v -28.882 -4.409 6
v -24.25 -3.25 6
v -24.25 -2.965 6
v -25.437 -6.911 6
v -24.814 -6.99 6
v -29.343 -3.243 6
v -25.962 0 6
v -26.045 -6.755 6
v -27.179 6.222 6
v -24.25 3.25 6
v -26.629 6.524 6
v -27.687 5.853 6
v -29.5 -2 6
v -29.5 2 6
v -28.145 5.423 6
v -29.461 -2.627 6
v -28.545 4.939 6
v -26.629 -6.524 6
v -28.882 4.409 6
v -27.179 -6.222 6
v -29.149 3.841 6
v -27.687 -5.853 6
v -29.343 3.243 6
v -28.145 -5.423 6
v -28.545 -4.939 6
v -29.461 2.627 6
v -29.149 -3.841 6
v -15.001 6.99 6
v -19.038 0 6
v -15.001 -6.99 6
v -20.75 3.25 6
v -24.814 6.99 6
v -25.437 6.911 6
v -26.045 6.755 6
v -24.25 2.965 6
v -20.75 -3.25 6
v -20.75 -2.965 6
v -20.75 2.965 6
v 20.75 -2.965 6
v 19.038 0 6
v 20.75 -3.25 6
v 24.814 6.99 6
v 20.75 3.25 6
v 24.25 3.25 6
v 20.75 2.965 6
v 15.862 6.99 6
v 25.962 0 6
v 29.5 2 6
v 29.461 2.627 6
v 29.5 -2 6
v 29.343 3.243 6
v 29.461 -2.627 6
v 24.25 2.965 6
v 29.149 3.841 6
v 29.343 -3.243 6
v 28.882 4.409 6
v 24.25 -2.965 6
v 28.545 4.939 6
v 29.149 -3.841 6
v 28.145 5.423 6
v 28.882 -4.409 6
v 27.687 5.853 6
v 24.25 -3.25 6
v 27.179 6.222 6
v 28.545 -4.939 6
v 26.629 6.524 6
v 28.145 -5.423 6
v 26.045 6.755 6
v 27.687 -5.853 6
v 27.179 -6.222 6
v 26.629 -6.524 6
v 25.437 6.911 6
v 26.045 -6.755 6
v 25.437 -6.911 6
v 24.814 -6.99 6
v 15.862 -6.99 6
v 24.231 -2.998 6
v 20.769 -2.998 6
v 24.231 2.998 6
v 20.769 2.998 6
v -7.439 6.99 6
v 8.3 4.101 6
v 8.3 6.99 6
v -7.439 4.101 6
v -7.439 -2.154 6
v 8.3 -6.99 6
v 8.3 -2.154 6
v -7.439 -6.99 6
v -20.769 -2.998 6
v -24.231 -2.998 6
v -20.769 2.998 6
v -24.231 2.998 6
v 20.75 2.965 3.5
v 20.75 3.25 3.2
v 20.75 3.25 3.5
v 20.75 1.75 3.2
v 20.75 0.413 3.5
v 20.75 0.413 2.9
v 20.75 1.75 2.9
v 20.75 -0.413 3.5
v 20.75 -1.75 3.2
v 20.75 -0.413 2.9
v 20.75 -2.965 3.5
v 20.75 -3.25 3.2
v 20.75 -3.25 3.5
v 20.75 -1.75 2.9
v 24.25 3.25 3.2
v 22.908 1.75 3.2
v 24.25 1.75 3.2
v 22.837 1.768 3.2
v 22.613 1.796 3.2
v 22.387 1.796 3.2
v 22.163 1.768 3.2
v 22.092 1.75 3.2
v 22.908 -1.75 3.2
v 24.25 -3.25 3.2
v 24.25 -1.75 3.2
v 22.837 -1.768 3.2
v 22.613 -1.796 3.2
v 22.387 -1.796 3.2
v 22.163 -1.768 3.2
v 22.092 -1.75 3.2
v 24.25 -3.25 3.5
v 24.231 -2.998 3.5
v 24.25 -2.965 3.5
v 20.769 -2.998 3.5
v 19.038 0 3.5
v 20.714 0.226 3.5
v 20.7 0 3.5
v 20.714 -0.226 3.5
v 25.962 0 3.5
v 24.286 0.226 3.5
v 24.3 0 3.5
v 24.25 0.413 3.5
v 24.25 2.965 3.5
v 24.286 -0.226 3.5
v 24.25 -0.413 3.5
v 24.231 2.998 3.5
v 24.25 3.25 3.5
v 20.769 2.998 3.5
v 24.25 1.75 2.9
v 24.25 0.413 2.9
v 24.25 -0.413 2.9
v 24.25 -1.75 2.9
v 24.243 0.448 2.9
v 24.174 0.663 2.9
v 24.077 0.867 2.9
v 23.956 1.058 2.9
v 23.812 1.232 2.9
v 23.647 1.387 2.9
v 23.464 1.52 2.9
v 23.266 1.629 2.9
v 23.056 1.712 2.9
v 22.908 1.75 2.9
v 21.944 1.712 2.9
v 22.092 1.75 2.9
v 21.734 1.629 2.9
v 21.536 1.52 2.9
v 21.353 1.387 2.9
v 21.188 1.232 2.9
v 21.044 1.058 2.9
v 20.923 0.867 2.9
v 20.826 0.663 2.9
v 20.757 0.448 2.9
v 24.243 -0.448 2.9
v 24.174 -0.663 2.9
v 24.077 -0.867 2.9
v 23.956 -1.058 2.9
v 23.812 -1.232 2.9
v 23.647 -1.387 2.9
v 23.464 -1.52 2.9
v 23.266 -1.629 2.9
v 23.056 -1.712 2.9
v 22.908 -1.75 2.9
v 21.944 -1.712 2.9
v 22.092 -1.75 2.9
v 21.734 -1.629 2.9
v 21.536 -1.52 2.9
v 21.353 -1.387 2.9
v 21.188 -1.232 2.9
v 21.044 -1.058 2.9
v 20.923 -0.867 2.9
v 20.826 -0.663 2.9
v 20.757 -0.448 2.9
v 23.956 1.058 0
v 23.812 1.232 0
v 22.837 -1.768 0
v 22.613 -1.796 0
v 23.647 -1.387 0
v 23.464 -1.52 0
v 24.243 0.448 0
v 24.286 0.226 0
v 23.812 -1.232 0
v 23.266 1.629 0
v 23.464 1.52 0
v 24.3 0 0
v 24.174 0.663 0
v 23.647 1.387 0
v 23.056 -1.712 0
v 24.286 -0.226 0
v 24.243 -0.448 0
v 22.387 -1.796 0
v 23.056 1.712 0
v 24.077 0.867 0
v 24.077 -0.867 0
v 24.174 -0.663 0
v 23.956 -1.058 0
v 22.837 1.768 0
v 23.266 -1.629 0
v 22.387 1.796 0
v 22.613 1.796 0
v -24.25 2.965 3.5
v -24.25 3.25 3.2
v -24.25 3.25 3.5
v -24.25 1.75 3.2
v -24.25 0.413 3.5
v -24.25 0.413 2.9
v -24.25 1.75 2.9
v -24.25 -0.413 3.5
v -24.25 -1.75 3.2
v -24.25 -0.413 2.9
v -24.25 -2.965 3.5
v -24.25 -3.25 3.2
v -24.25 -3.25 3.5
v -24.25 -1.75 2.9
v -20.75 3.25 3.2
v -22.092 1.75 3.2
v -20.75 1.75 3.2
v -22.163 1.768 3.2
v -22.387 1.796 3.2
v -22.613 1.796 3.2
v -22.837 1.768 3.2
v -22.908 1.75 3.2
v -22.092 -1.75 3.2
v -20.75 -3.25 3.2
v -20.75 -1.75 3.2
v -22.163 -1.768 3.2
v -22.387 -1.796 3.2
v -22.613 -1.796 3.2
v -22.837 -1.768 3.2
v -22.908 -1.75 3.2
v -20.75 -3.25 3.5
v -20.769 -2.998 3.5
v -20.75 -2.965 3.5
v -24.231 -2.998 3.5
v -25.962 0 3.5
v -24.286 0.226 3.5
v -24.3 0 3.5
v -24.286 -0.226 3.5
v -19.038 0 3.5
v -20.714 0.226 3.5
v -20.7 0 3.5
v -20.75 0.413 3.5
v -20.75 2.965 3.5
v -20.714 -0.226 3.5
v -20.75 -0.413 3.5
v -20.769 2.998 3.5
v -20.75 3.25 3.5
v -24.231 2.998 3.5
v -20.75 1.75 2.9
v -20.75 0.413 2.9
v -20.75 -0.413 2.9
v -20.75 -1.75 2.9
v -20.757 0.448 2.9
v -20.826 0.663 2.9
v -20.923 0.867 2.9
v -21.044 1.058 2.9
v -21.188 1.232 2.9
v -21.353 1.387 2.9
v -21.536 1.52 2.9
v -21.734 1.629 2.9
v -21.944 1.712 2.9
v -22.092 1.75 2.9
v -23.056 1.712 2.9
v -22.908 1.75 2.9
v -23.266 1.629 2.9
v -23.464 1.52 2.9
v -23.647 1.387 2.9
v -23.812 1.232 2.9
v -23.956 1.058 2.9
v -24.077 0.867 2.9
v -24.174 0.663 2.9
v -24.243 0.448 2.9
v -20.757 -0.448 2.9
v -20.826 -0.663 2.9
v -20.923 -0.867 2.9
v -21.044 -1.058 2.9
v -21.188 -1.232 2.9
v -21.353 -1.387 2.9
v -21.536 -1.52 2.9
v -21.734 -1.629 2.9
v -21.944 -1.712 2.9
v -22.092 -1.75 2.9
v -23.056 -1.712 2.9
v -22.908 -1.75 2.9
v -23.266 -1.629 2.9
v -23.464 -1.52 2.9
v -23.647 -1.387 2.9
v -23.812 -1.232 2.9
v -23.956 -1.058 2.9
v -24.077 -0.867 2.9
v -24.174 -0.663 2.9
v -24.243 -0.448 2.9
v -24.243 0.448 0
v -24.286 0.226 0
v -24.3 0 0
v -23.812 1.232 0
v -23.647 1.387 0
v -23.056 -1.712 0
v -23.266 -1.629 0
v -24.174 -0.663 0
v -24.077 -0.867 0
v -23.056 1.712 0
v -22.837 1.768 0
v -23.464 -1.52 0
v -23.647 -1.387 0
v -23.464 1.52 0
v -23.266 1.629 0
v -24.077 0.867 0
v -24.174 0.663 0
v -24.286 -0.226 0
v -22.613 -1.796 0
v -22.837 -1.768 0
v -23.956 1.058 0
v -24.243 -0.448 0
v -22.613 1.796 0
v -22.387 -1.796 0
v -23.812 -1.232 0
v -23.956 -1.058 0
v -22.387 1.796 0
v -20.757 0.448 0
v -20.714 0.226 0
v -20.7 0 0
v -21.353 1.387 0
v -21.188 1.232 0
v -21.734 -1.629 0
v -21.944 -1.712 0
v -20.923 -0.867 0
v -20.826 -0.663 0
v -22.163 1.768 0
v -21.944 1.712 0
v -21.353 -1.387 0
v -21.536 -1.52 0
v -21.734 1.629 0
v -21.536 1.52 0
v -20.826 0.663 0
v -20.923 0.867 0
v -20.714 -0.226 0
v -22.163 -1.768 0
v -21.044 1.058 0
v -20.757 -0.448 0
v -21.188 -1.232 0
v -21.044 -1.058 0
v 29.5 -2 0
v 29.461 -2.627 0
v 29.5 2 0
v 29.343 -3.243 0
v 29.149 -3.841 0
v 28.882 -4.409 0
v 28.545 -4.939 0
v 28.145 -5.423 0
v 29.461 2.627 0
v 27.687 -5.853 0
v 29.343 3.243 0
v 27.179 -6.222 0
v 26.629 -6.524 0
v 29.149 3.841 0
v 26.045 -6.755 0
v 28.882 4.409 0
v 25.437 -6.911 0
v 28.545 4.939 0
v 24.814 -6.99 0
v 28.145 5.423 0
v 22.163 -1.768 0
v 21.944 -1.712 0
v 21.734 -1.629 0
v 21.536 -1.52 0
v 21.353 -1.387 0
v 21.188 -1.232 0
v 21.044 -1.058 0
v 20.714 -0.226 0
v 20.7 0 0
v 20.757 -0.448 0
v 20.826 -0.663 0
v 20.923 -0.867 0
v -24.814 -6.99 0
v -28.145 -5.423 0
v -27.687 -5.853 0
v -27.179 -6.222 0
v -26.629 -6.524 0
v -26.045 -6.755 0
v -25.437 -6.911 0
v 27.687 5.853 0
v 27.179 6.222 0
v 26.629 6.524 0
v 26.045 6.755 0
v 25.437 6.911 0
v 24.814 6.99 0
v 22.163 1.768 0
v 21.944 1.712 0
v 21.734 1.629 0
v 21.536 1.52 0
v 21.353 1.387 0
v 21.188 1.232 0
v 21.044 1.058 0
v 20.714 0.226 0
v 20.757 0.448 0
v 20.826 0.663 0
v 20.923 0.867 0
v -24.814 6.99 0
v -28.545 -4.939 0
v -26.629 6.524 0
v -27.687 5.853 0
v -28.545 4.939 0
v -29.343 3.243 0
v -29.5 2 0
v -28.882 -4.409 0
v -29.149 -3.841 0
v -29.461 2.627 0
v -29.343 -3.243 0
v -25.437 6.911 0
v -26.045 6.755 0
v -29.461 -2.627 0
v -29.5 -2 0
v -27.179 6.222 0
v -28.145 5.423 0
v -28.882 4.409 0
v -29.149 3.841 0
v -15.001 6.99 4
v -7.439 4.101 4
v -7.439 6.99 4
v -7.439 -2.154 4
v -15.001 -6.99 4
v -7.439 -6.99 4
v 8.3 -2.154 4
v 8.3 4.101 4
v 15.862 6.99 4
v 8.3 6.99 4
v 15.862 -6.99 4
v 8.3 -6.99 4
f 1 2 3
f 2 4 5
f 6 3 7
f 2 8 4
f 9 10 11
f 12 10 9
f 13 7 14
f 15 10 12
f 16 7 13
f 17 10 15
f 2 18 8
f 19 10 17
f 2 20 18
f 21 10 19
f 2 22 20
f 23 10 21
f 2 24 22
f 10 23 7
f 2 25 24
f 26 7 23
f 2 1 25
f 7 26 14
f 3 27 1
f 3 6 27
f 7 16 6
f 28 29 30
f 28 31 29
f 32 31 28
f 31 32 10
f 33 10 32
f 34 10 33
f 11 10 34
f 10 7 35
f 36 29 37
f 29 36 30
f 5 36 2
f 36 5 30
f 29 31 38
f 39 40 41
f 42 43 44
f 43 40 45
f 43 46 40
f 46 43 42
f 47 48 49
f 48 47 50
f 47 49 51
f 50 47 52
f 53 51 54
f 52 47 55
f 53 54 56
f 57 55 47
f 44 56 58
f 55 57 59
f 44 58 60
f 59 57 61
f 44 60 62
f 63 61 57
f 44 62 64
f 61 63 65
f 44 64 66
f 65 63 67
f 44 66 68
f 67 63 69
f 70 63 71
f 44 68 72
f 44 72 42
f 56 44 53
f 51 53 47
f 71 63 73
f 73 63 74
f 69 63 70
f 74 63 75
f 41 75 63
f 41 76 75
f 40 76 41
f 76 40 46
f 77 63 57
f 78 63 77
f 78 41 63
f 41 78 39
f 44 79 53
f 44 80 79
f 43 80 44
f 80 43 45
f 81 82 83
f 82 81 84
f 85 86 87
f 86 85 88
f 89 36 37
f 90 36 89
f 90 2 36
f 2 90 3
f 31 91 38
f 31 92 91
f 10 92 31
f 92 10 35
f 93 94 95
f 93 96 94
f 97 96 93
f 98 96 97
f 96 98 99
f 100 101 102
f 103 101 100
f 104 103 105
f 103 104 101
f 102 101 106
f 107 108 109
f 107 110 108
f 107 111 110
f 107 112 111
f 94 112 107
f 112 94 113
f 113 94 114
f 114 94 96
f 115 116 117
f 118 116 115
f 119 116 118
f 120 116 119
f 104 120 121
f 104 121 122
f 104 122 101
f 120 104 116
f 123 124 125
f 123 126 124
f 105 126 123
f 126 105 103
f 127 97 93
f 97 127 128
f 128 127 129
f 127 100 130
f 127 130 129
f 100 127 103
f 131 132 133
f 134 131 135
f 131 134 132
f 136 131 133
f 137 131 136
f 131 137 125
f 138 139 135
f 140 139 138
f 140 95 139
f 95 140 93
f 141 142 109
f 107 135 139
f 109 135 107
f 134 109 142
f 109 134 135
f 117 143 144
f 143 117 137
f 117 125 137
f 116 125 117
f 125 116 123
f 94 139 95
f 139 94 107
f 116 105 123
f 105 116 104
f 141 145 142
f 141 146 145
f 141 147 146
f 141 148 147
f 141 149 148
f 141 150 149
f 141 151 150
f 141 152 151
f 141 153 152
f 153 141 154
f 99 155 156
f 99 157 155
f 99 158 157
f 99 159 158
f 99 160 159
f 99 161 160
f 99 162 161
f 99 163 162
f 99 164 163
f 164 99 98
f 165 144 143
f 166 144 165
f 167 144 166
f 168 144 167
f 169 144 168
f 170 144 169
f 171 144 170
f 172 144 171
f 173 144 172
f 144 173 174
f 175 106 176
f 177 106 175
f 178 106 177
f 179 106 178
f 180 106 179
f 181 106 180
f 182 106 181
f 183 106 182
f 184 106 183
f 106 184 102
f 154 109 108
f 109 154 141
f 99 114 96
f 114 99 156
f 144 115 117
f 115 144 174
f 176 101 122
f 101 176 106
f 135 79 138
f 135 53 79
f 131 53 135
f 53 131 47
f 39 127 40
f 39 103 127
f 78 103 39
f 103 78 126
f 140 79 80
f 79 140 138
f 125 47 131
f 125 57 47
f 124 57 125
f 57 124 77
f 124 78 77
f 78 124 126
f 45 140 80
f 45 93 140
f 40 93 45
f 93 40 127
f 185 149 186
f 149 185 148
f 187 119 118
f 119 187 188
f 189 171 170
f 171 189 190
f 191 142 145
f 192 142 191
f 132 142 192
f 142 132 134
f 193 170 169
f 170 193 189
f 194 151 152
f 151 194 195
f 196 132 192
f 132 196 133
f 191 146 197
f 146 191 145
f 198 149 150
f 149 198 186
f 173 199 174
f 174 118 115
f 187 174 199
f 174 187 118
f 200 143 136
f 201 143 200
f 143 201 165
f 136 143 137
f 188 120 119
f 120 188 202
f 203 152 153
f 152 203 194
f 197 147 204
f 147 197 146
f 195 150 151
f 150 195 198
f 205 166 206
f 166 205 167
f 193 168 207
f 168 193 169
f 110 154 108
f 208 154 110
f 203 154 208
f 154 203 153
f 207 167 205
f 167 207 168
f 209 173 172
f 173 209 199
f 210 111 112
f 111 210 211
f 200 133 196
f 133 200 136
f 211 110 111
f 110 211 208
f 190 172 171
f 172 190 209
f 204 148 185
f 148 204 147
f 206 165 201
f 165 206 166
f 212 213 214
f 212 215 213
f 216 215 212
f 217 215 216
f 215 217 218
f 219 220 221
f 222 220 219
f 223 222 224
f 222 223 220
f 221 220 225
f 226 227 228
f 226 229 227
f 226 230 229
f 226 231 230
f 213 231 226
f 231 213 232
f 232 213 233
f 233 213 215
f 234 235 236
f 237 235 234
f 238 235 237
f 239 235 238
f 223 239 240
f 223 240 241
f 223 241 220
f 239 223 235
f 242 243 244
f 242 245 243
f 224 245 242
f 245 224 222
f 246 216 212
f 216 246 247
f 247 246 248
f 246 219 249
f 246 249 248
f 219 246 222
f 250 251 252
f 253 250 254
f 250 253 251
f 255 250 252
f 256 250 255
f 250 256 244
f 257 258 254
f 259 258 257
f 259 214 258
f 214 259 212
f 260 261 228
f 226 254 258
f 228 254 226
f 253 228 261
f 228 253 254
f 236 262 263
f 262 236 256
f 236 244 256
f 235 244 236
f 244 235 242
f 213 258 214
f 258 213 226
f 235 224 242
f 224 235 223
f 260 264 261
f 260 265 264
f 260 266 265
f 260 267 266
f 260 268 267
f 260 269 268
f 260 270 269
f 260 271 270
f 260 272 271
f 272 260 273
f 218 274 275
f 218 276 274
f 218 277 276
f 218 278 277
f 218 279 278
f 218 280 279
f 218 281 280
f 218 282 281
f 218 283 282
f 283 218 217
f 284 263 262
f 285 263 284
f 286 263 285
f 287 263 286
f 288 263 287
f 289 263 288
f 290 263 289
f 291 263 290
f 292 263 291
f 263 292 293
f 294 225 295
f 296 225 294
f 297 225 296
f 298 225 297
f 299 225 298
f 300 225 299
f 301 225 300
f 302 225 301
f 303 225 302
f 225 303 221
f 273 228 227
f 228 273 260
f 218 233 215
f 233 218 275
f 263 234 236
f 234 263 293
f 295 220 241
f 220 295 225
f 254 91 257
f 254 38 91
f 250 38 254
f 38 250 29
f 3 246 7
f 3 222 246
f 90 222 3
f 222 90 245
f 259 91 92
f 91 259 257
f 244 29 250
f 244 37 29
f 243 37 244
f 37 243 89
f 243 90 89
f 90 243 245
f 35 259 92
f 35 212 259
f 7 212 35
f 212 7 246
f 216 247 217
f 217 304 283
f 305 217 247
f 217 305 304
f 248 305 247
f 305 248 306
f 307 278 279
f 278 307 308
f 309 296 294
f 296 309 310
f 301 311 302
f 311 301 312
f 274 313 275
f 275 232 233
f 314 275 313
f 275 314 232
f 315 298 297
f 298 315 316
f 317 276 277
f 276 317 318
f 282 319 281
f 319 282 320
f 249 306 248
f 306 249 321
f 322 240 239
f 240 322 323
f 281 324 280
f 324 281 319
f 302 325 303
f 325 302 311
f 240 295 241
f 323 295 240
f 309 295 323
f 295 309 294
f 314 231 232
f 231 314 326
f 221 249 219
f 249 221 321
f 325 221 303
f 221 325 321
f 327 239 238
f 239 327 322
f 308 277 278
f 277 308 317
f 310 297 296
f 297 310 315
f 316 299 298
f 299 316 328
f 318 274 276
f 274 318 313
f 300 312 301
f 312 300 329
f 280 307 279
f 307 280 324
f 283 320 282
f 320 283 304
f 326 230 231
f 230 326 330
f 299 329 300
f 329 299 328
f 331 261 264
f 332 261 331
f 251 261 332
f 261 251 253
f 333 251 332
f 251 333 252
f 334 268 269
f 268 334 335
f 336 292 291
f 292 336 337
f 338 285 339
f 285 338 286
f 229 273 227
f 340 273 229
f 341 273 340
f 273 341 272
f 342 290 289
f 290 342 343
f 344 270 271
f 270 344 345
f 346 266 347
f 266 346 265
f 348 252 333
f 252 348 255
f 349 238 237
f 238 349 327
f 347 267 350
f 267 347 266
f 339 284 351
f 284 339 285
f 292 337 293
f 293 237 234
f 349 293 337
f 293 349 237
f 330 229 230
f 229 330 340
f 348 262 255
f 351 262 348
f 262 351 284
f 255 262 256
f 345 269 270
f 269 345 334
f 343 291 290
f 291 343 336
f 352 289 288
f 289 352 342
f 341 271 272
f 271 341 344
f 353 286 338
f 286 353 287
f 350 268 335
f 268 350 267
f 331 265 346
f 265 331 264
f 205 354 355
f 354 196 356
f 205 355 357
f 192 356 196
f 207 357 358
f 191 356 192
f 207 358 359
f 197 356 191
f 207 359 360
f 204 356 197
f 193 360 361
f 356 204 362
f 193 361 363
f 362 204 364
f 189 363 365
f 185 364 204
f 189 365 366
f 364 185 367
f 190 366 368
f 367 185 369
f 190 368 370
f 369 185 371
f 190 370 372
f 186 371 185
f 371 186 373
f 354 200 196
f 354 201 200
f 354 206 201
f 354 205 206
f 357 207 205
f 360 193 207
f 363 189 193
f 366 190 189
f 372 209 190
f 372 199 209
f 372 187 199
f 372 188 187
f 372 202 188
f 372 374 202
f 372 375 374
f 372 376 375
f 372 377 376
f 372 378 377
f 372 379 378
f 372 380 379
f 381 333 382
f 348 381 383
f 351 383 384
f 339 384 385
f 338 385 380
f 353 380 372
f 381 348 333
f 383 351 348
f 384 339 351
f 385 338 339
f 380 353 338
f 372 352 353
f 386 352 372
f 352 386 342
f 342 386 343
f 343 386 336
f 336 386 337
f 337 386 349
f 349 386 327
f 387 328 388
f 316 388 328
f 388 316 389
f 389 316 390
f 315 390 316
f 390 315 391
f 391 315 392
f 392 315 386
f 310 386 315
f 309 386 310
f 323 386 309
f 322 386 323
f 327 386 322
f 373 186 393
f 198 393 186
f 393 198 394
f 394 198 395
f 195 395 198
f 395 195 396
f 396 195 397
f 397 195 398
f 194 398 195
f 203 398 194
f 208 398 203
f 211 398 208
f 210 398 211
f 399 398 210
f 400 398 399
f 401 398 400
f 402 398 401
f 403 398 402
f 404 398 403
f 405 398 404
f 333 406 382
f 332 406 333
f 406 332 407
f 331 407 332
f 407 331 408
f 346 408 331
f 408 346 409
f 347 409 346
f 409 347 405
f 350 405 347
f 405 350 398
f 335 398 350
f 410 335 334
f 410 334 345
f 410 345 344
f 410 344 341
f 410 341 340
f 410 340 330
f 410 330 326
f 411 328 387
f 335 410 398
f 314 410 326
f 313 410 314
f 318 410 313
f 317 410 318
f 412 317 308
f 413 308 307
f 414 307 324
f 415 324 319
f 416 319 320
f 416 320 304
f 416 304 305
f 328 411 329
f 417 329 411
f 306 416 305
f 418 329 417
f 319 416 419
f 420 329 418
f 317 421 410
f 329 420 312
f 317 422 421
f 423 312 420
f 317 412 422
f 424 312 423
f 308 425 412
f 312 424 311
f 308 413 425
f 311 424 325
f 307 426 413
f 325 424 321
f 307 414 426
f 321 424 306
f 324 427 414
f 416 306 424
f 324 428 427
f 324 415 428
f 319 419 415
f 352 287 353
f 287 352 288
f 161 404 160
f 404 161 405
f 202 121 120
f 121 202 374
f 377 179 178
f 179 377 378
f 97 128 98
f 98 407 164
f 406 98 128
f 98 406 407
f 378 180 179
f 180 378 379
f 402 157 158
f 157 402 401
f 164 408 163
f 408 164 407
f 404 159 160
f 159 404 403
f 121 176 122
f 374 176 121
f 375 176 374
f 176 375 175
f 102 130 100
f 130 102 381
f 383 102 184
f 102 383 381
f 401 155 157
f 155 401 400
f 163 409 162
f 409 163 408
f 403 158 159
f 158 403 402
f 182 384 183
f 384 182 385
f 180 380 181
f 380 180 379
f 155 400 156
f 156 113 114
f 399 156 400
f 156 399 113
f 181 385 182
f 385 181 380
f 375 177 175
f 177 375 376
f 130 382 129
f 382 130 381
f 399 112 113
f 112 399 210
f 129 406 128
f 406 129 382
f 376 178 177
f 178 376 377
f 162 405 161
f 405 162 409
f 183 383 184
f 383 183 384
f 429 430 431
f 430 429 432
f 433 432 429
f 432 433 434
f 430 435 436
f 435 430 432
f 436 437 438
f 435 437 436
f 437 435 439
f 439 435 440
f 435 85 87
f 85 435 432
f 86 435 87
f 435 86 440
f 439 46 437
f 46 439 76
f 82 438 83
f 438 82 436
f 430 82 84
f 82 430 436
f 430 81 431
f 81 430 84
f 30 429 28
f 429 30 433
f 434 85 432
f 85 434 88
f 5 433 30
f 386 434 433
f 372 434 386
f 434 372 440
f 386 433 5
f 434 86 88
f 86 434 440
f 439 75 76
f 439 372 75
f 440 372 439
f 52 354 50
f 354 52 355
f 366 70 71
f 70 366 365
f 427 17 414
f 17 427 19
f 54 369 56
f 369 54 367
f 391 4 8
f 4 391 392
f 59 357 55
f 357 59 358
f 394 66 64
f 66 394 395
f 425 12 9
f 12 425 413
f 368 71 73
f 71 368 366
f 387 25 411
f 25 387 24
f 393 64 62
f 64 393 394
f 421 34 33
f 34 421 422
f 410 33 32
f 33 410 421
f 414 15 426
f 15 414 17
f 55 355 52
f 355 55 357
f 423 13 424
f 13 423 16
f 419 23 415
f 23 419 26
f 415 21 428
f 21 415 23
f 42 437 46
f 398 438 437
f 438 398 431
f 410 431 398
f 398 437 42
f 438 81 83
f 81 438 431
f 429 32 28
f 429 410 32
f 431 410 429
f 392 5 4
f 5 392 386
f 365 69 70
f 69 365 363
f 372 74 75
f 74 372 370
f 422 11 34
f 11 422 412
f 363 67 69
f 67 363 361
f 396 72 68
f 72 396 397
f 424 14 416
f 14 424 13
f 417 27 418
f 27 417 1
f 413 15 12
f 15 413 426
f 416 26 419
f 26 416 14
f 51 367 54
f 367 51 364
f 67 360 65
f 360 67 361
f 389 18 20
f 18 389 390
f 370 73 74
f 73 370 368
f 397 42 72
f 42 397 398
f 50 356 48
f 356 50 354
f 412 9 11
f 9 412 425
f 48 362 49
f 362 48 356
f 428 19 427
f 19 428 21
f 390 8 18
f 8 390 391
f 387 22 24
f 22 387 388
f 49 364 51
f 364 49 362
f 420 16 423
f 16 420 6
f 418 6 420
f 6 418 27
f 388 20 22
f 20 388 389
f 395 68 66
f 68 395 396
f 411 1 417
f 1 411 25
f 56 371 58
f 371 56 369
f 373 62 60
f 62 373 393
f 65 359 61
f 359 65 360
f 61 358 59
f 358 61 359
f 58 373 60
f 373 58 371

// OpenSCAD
$fn = 50;


difference() {
	union() {
		hull() {
			translate(v = [-24.5000000000, 2.0000000000, 0]) {
				cylinder(h = 6, r = 5);
			}
			translate(v = [24.5000000000, 2.0000000000, 0]) {
				cylinder(h = 6, r = 5);
			}
			translate(v = [-24.5000000000, -2.0000000000, 0]) {
				cylinder(h = 6, r = 5);
			}
			translate(v = [24.5000000000, -2.0000000000, 0]) {
				cylinder(h = 6, r = 5);
			}
		}
	}
	union() {
		translate(v = [22.5000000000, 0, -20]) {
			rotate(a = [0, 180, 0]) {
				difference() {
					union() {
						translate(v = [0, 0, -26.0000000000]) {
							rotate(a = [0, 0, 0]) {
								difference() {
									union() {
										#translate(v = [-1.7500000000, -3.2500000000, -0.3000000000]) {
											cube(size = [3.5000000000, 6.5000000000, 0.3000000000]);
										}
										#translate(v = [-1.7500000000, -1.7500000000, -0.6000000000]) {
											cube(size = [3.5000000000, 3.5000000000, 0.3000000000]);
										}
										#translate(v = [-1.7500000000, -3.2500000000, 2.5000000000]) {
											cube(size = [3.5000000000, 6.5000000000, 0.3000000000]);
										}
										#translate(v = [-1.7500000000, -1.7500000000, 2.8000000000]) {
											cube(size = [3.5000000000, 3.5000000000, 0.3000000000]);
										}
										#linear_extrude(height = 2.5000000000) {
											polygon(points = [[3.4620000000, 0.0000000000], [1.7310000000, 2.9981799479], [-1.7310000000, 2.9981799479], [-3.4620000000, 0.0000000000], [-1.7310000000, -2.9981799479], [1.7310000000, -2.9981799479]]);
										}
										#translate(v = [-1.7500000000, -3.2500000000, -0.3000000000]) {
											cube(size = [3.5000000000, 6.5000000000, 0.3000000000]);
										}
										#translate(v = [-1.7500000000, -1.7500000000, -0.6000000000]) {
											cube(size = [3.5000000000, 3.5000000000, 0.3000000000]);
										}
										#translate(v = [-1.7500000000, -3.2500000000, 2.5000000000]) {
											cube(size = [3.5000000000, 6.5000000000, 0.3000000000]);
										}
										#translate(v = [-1.7500000000, -1.7500000000, 2.8000000000]) {
											cube(size = [3.5000000000, 3.5000000000, 0.3000000000]);
										}
										#translate(v = [-1.7500000000, -3.2500000000, -0.3000000000]) {
											cube(size = [3.5000000000, 6.5000000000, 0.3000000000]);
										}
										#translate(v = [-1.7500000000, -1.7500000000, -0.6000000000]) {
											cube(size = [3.5000000000, 3.5000000000, 0.3000000000]);
										}
										#translate(v = [-1.7500000000, -3.2500000000, 2.5000000000]) {
											cube(size = [3.5000000000, 6.5000000000, 0.3000000000]);
										}
										#translate(v = [-1.7500000000, -1.7500000000, 2.8000000000]) {
											cube(size = [3.5000000000, 3.5000000000, 0.3000000000]);
										}
									}
									union();
								}
							}
						}
						translate(v = [0, 0, -26.0000000000]) {
							rotate(a = [0, 0, 0]) {
								difference() {
									union() {
										#translate(v = [-1.7500000000, -3.2500000000, -0.3000000000]) {
											cube(size = [3.5000000000, 6.5000000000, 0.3000000000]);
										}
										#translate(v = [-1.7500000000, -1.7500000000, -0.6000000000]) {
											cube(size = [3.5000000000, 3.5000000000, 0.3000000000]);
										}
										#translate(v = [-1.7500000000, -3.2500000000, 2.5000000000]) {
											cube(size = [3.5000000000, 6.5000000000, 0.3000000000]);
										}
										#translate(v = [-1.7500000000, -1.7500000000, 2.8000000000]) {
											cube(size = [3.5000000000, 3.5000000000, 0.3000000000]);
										}
										#linear_extrude(height = 2.5000000000) {
											polygon(points = [[3.4620000000, 0.0000000000], [1.7310000000, 2.9981799479], [-1.7310000000, 2.9981799479], [-3.4620000000, 0.0000000000], [-1.7310000000, -2.9981799479], [1.7310000000, -2.9981799479]]);
										}
										#translate(v = [-1.7500000000, -3.2500000000, -0.3000000000]) {
											cube(size = [3.5000000000, 6.5000000000, 0.3000000000]);
										}
										#translate(v = [-1.7500000000, -1.7500000000, -0.6000000000]) {
											cube(size = [3.5000000000, 3.5000000000, 0.3000000000]);
										}
										#translate(v = [-1.7500000000, -3.2500000000, 2.5000000000]) {
											cube(size = [3.5000000000, 6.5000000000, 0.3000000000]);
										}
										#translate(v = [-1.7500000000, -1.7500000000, 2.8000000000]) {
											cube(size = [3.5000000000, 3.5000000000, 0.3000000000]);
										}
										#translate(v = [-1.7500000000, -3.2500000000, -0.3000000000]) {
											cube(size = [3.5000000000, 6.5000000000, 0.3000000000]);
										}
										#translate(v = [-1.7500000000, -1.7500000000, -0.6000000000]) {
											cube(size = [3.5000000000, 3.5000000000, 0.3000000000]);
										}
										#translate(v = [-1.7500000000, -3.2500000000, 2.5000000000]) {
											cube(size = [3.5000000000, 6.5000000000, 0.3000000000]);
										}
										#translate(v = [-1.7500000000, -1.7500000000, 2.8000000000]) {
											cube(size = [3.5000000000, 3.5000000000, 0.3000000000]);
										}
									}
									union();
								}
							}
						}
						translate(v = [0, 0, -26.0000000000]) {
							rotate(a = [0, 0, 0]) {
								difference() {
									union() {
										#translate(v = [-1.7500000000, -3.2500000000, -0.3000000000]) {
											cube(size = [3.5000000000, 6.5000000000, 0.3000000000]);
										}
										#translate(v = [-1.7500000000, -1.7500000000, -0.6000000000]) {
											cube(size = [3.5000000000, 3.5000000000, 0.3000000000]);
										}
										#translate(v = [-1.7500000000, -3.2500000000, 2.5000000000]) {
											cube(size = [3.5000000000, 6.5000000000, 0.3000000000]);
										}
										#translate(v = [-1.7500000000, -1.7500000000, 2.8000000000]) {
											cube(size = [3.5000000000, 3.5000000000, 0.3000000000]);
										}
										#linear_extrude(height = 2.5000000000) {
											polygon(points = [[3.4620000000, 0.0000000000], [1.7310000000, 2.9981799479], [-1.7310000000, 2.9981799479], [-3.4620000000, 0.0000000000], [-1.7310000000, -2.9981799479], [1.7310000000, -2.9981799479]]);
										}
										#translate(v = [-1.7500000000, -3.2500000000, -0.3000000000]) {
											cube(size = [3.5000000000, 6.5000000000, 0.3000000000]);
										}
										#translate(v = [-1.7500000000, -1.7500000000, -0.6000000000]) {
											cube(size = [3.5000000000, 3.5000000000, 0.3000000000]);
										}
										#translate(v = [-1.7500000000, -3.2500000000, 2.5000000000]) {
											cube(size = [3.5000000000, 6.5000000000, 0.3000000000]);
										}
										#translate(v = [-1.7500000000, -1.7500000000, 2.8000000000]) {
											cube(size = [3.5000000000, 3.5000000000, 0.3000000000]);
										}
										#translate(v = [-1.7500000000, -3.2500000000, -0.3000000000]) {
											cube(size = [3.5000000000, 6.5000000000, 0.3000000000]);
										}
										#translate(v = [-1.7500000000, -1.7500000000, -0.6000000000]) {
											cube(size = [3.5000000000, 3.5000000000, 0.3000000000]);
										}
										#translate(v = [-1.7500000000, -3.2500000000, 2.5000000000]) {
											cube(size = [3.5000000000, 6.5000000000, 0.3000000000]);
										}
										#translate(v = [-1.7500000000, -1.7500000000, 2.8000000000]) {
											cube(size = [3.5000000000, 3.5000000000, 0.3000000000]);
										}
									}
									union();
								}
							}
						}
						#translate(v = [0, 0, -26.0000000000]) {
							cylinder(h = 26, r = 1.5000000000);
						}
						#translate(v = [0, 0, -1.9000000000]) {
							cylinder(h = 1.9000000000, r1 = 1.8000000000, r2 = 3.6000000000);
						}
						#translate(v = [0, 0, -26.0000000000]) {
							cylinder(h = 26, r = 1.8000000000);
						}
						#translate(v = [0, 0, -26.0000000000]) {
							cylinder(h = 26, r = 1.5000000000);
						}
					}
					union();
				}
			}
		}
		translate(v = [-22.5000000000, 0, -20]) {
			rotate(a = [0, 180, 0]) {
				difference() {
					union() {
						translate(v = [0, 0, -26.0000000000]) {
							rotate(a = [0, 0, 0]) {
								difference() {
									union() {
										#translate(v = [-1.7500000000, -3.2500000000, -0.3000000000]) {
											cube(size = [3.5000000000, 6.5000000000, 0.3000000000]);
										}
										#translate(v = [-1.7500000000, -1.7500000000, -0.6000000000]) {
											cube(size = [3.5000000000, 3.5000000000, 0.3000000000]);
										}
										#translate(v = [-1.7500000000, -3.2500000000, 2.5000000000]) {
											cube(size = [3.5000000000, 6.5000000000, 0.3000000000]);
										}
										#translate(v = [-1.7500000000, -1.7500000000, 2.8000000000]) {
											cube(size = [3.5000000000, 3.5000000000, 0.3000000000]);
										}
										#linear_extrude(height = 2.5000000000) {
											polygon(points = [[3.4620000000, 0.0000000000], [1.7310000000, 2.9981799479], [-1.7310000000, 2.9981799479], [-3.4620000000, 0.0000000000], [-1.7310000000, -2.9981799479], [1.7310000000, -2.9981799479]]);
										}
										#translate(v = [-1.7500000000, -3.2500000000, -0.3000000000]) {
											cube(size = [3.5000000000, 6.5000000000, 0.3000000000]);
										}
										#translate(v = [-1.7500000000, -1.7500000000, -0.6000000000]) {
											cube(size = [3.5000000000, 3.5000000000, 0.3000000000]);
										}
										#translate(v = [-1.7500000000, -3.2500000000, 2.5000000000]) {
											cube(size = [3.5000000000, 6.5000000000, 0.3000000000]);
										}
										#translate(v = [-1.7500000000, -1.7500000000, 2.8000000000]) {
											cube(size = [3.5000000000, 3.5000000000, 0.3000000000]);
										}
										#translate(v = [-1.7500000000, -3.2500000000, -0.3000000000]) {
											cube(size = [3.5000000000, 6.5000000000, 0.3000000000]);
										}
										#translate(v = [-1.7500000000, -1.7500000000, -0.6000000000]) {
											cube(size = [3.5000000000, 3.5000000000, 0.3000000000]);
										}
										#translate(v = [-1.7500000000, -3.2500000000, 2.5000000000]) {
											cube(size = [3.5000000000, 6.5000000000, 0.3000000000]);
										}
										#translate(v = [-1.7500000000, -1.7500000000, 2.8000000000]) {
											cube(size = [3.5000000000, 3.5000000000, 0.3000000000]);
										}
									}
									union();
								}
							}
						}
						translate(v = [0, 0, -26.0000000000]) {
							rotate(a = [0, 0, 0]) {
								difference() {
									union() {
										#translate(v = [-1.7500000000, -3.2500000000, -0.3000000000]) {
											cube(size = [3.5000000000, 6.5000000000, 0.3000000000]);
										}
										#translate(v = [-1.7500000000, -1.7500000000, -0.6000000000]) {
											cube(size = [3.5000000000, 3.5000000000, 0.3000000000]);
										}
										#translate(v = [-1.7500000000, -3.2500000000, 2.5000000000]) {
											cube(size = [3.5000000000, 6.5000000000, 0.3000000000]);
										}
										#translate(v = [-1.7500000000, -1.7500000000, 2.8000000000]) {
											cube(size = [3.5000000000, 3.5000000000, 0.3000000000]);
										}
										#linear_extrude(height = 2.5000000000) {
											polygon(points = [[3.4620000000, 0.0000000000], [1.7310000000, 2.9981799479], [-1.7310000000, 2.9981799479], [-3.4620000000, 0.0000000000], [-1.7310000000, -2.9981799479], [1.7310000000, -2.9981799479]]);
										}
										#translate(v = [-1.7500000000, -3.2500000000, -0.3000000000]) {
											cube(size = [3.5000000000, 6.5000000000, 0.3000000000]);
										}
										#translate(v = [-1.7500000000, -1.7500000000, -0.6000000000]) {
											cube(size = [3.5000000000, 3.5000000000, 0.3000000000]);
										}
										#translate(v = [-1.7500000000, -3.2500000000, 2.5000000000]) {
											cube(size = [3.5000000000, 6.5000000000, 0.3000000000]);
										}
										#translate(v = [-1.7500000000, -1.7500000000, 2.8000000000]) {
											cube(size = [3.5000000000, 3.5000000000, 0.3000000000]);
										}
										#translate(v = [-1.7500000000, -3.2500000000, -0.3000000000]) {
											cube(size = [3.5000000000, 6.5000000000, 0.3000000000]);
										}
										#translate(v = [-1.7500000000, -1.7500000000, -0.6000000000]) {
											cube(size = [3.5000000000, 3.5000000000, 0.3000000000]);
										}
										#translate(v = [-1.7500000000, -3.2500000000, 2.5000000000]) {
											cube(size = [3.5000000000, 6.5000000000, 0.3000000000]);
										}
										#translate(v = [-1.7500000000, -1.7500000000, 2.8000000000]) {
											cube(size = [3.5000000000, 3.5000000000, 0.3000000000]);
										}
									}
									union();
								}
							}
						}
						translate(v = [0, 0, -26.0000000000]) {
							rotate(a = [0, 0, 0]) {
								difference() {
									union() {
										#translate(v = [-1.7500000000, -3.2500000000, -0.3000000000]) {
											cube(size = [3.5000000000, 6.5000000000, 0.3000000000]);
										}
										#translate(v = [-1.7500000000, -1.7500000000, -0.6000000000]) {
											cube(size = [3.5000000000, 3.5000000000, 0.3000000000]);
										}
										#translate(v = [-1.7500000000, -3.2500000000, 2.5000000000]) {
											cube(size = [3.5000000000, 6.5000000000, 0.3000000000]);
										}
										#translate(v = [-1.7500000000, -1.7500000000, 2.8000000000]) {
											cube(size = [3.5000000000, 3.5000000000, 0.3000000000]);
										}
										#linear_extrude(height = 2.5000000000) {
											polygon(points = [[3.4620000000, 0.0000000000], [1.7310000000, 2.9981799479], [-1.7310000000, 2.9981799479], [-3.4620000000, 0.0000000000], [-1.7310000000, -2.9981799479], [1.7310000000, -2.9981799479]]);
										}
										#translate(v = [-1.7500000000, -3.2500000000, -0.3000000000]) {
											cube(size = [3.5000000000, 6.5000000000, 0.3000000000]);
										}
										#translate(v = [-1.7500000000, -1.7500000000, -0.6000000000]) {
											cube(size = [3.5000000000, 3.5000000000, 0.3000000000]);
										}
										#translate(v = [-1.7500000000, -3.2500000000, 2.5000000000]) {
											cube(size = [3.5000000000, 6.5000000000, 0.3000000000]);
										}
										#translate(v = [-1.7500000000, -1.7500000000, 2.8000000000]) {
											cube(size = [3.5000000000, 3.5000000000, 0.3000000000]);
										}
										#translate(v = [-1.7500000000, -3.2500000000, -0.3000000000]) {
											cube(size = [3.5000000000, 6.5000000000, 0.3000000000]);
										}
										#translate(v = [-1.7500000000, -1.7500000000, -0.6000000000]) {
											cube(size = [3.5000000000, 3.5000000000, 0.3000000000]);
										}
										#translate(v = [-1.7500000000, -3.2500000000, 2.5000000000]) {
											cube(size = [3.5000000000, 6.5000000000, 0.3000000000]);
										}
										#translate(v = [-1.7500000000, -1.7500000000, 2.8000000000]) {
											cube(size = [3.5000000000, 3.5000000000, 0.3000000000]);
										}
									}
									union();
								}
							}
						}
						#translate(v = [0, 0, -26.0000000000]) {
							cylinder(h = 26, r = 1.5000000000);
						}
						#translate(v = [0, 0, -1.9000000000]) {
							cylinder(h = 1.9000000000, r1 = 1.8000000000, r2 = 3.6000000000);
						}
						#translate(v = [0, 0, -26.0000000000]) {
							cylinder(h = 26, r = 1.8000000000);
						}
						#translate(v = [0, 0, -26.0000000000]) {
							cylinder(h = 26, r = 1.5000000000);
						}
					}
					union();
				}
			}
		}
		translate(v = [-22.5000000000, 0.0000000000, 0]) {
			cylinder(h = 6, r = 1.8000000000);
		}
		translate(v = [22.5000000000, 0.0000000000, 0]) {
			cylinder(h = 6, r = 1.8000000000);
		}
		translate(v = [-22.5000000000, 0.0000000000, 0]) {
			cylinder(h = 6, r = 1.8000000000);
		}
		translate(v = [22.5000000000, 0.0000000000, 0]) {
			cylinder(h = 6, r = 1.8000000000);
		}
		translate(v = [-22.5000000000, 0.0000000000, 0]) {
			cylinder(h = 6, r = 1.8000000000);
		}
		translate(v = [22.5000000000, 0.0000000000, 0]) {
			cylinder(h = 6, r = 1.8000000000);
		}
		translate(v = [-22.5000000000, 0.0000000000, 0]) {
			cylinder(h = 6, r = 1.8000000000);
		}
		translate(v = [22.5000000000, 0.0000000000, 0]) {
			cylinder(h = 6, r = 1.8000000000);
		}
		#translate(v = [0, 0, 4]) {
			linear_extrude(height = 2) {
				text(font = "Arial:Bold", halign = "center", size = 37.8000000000, text = "H", valign = "center");
			}
		}
	}
}
